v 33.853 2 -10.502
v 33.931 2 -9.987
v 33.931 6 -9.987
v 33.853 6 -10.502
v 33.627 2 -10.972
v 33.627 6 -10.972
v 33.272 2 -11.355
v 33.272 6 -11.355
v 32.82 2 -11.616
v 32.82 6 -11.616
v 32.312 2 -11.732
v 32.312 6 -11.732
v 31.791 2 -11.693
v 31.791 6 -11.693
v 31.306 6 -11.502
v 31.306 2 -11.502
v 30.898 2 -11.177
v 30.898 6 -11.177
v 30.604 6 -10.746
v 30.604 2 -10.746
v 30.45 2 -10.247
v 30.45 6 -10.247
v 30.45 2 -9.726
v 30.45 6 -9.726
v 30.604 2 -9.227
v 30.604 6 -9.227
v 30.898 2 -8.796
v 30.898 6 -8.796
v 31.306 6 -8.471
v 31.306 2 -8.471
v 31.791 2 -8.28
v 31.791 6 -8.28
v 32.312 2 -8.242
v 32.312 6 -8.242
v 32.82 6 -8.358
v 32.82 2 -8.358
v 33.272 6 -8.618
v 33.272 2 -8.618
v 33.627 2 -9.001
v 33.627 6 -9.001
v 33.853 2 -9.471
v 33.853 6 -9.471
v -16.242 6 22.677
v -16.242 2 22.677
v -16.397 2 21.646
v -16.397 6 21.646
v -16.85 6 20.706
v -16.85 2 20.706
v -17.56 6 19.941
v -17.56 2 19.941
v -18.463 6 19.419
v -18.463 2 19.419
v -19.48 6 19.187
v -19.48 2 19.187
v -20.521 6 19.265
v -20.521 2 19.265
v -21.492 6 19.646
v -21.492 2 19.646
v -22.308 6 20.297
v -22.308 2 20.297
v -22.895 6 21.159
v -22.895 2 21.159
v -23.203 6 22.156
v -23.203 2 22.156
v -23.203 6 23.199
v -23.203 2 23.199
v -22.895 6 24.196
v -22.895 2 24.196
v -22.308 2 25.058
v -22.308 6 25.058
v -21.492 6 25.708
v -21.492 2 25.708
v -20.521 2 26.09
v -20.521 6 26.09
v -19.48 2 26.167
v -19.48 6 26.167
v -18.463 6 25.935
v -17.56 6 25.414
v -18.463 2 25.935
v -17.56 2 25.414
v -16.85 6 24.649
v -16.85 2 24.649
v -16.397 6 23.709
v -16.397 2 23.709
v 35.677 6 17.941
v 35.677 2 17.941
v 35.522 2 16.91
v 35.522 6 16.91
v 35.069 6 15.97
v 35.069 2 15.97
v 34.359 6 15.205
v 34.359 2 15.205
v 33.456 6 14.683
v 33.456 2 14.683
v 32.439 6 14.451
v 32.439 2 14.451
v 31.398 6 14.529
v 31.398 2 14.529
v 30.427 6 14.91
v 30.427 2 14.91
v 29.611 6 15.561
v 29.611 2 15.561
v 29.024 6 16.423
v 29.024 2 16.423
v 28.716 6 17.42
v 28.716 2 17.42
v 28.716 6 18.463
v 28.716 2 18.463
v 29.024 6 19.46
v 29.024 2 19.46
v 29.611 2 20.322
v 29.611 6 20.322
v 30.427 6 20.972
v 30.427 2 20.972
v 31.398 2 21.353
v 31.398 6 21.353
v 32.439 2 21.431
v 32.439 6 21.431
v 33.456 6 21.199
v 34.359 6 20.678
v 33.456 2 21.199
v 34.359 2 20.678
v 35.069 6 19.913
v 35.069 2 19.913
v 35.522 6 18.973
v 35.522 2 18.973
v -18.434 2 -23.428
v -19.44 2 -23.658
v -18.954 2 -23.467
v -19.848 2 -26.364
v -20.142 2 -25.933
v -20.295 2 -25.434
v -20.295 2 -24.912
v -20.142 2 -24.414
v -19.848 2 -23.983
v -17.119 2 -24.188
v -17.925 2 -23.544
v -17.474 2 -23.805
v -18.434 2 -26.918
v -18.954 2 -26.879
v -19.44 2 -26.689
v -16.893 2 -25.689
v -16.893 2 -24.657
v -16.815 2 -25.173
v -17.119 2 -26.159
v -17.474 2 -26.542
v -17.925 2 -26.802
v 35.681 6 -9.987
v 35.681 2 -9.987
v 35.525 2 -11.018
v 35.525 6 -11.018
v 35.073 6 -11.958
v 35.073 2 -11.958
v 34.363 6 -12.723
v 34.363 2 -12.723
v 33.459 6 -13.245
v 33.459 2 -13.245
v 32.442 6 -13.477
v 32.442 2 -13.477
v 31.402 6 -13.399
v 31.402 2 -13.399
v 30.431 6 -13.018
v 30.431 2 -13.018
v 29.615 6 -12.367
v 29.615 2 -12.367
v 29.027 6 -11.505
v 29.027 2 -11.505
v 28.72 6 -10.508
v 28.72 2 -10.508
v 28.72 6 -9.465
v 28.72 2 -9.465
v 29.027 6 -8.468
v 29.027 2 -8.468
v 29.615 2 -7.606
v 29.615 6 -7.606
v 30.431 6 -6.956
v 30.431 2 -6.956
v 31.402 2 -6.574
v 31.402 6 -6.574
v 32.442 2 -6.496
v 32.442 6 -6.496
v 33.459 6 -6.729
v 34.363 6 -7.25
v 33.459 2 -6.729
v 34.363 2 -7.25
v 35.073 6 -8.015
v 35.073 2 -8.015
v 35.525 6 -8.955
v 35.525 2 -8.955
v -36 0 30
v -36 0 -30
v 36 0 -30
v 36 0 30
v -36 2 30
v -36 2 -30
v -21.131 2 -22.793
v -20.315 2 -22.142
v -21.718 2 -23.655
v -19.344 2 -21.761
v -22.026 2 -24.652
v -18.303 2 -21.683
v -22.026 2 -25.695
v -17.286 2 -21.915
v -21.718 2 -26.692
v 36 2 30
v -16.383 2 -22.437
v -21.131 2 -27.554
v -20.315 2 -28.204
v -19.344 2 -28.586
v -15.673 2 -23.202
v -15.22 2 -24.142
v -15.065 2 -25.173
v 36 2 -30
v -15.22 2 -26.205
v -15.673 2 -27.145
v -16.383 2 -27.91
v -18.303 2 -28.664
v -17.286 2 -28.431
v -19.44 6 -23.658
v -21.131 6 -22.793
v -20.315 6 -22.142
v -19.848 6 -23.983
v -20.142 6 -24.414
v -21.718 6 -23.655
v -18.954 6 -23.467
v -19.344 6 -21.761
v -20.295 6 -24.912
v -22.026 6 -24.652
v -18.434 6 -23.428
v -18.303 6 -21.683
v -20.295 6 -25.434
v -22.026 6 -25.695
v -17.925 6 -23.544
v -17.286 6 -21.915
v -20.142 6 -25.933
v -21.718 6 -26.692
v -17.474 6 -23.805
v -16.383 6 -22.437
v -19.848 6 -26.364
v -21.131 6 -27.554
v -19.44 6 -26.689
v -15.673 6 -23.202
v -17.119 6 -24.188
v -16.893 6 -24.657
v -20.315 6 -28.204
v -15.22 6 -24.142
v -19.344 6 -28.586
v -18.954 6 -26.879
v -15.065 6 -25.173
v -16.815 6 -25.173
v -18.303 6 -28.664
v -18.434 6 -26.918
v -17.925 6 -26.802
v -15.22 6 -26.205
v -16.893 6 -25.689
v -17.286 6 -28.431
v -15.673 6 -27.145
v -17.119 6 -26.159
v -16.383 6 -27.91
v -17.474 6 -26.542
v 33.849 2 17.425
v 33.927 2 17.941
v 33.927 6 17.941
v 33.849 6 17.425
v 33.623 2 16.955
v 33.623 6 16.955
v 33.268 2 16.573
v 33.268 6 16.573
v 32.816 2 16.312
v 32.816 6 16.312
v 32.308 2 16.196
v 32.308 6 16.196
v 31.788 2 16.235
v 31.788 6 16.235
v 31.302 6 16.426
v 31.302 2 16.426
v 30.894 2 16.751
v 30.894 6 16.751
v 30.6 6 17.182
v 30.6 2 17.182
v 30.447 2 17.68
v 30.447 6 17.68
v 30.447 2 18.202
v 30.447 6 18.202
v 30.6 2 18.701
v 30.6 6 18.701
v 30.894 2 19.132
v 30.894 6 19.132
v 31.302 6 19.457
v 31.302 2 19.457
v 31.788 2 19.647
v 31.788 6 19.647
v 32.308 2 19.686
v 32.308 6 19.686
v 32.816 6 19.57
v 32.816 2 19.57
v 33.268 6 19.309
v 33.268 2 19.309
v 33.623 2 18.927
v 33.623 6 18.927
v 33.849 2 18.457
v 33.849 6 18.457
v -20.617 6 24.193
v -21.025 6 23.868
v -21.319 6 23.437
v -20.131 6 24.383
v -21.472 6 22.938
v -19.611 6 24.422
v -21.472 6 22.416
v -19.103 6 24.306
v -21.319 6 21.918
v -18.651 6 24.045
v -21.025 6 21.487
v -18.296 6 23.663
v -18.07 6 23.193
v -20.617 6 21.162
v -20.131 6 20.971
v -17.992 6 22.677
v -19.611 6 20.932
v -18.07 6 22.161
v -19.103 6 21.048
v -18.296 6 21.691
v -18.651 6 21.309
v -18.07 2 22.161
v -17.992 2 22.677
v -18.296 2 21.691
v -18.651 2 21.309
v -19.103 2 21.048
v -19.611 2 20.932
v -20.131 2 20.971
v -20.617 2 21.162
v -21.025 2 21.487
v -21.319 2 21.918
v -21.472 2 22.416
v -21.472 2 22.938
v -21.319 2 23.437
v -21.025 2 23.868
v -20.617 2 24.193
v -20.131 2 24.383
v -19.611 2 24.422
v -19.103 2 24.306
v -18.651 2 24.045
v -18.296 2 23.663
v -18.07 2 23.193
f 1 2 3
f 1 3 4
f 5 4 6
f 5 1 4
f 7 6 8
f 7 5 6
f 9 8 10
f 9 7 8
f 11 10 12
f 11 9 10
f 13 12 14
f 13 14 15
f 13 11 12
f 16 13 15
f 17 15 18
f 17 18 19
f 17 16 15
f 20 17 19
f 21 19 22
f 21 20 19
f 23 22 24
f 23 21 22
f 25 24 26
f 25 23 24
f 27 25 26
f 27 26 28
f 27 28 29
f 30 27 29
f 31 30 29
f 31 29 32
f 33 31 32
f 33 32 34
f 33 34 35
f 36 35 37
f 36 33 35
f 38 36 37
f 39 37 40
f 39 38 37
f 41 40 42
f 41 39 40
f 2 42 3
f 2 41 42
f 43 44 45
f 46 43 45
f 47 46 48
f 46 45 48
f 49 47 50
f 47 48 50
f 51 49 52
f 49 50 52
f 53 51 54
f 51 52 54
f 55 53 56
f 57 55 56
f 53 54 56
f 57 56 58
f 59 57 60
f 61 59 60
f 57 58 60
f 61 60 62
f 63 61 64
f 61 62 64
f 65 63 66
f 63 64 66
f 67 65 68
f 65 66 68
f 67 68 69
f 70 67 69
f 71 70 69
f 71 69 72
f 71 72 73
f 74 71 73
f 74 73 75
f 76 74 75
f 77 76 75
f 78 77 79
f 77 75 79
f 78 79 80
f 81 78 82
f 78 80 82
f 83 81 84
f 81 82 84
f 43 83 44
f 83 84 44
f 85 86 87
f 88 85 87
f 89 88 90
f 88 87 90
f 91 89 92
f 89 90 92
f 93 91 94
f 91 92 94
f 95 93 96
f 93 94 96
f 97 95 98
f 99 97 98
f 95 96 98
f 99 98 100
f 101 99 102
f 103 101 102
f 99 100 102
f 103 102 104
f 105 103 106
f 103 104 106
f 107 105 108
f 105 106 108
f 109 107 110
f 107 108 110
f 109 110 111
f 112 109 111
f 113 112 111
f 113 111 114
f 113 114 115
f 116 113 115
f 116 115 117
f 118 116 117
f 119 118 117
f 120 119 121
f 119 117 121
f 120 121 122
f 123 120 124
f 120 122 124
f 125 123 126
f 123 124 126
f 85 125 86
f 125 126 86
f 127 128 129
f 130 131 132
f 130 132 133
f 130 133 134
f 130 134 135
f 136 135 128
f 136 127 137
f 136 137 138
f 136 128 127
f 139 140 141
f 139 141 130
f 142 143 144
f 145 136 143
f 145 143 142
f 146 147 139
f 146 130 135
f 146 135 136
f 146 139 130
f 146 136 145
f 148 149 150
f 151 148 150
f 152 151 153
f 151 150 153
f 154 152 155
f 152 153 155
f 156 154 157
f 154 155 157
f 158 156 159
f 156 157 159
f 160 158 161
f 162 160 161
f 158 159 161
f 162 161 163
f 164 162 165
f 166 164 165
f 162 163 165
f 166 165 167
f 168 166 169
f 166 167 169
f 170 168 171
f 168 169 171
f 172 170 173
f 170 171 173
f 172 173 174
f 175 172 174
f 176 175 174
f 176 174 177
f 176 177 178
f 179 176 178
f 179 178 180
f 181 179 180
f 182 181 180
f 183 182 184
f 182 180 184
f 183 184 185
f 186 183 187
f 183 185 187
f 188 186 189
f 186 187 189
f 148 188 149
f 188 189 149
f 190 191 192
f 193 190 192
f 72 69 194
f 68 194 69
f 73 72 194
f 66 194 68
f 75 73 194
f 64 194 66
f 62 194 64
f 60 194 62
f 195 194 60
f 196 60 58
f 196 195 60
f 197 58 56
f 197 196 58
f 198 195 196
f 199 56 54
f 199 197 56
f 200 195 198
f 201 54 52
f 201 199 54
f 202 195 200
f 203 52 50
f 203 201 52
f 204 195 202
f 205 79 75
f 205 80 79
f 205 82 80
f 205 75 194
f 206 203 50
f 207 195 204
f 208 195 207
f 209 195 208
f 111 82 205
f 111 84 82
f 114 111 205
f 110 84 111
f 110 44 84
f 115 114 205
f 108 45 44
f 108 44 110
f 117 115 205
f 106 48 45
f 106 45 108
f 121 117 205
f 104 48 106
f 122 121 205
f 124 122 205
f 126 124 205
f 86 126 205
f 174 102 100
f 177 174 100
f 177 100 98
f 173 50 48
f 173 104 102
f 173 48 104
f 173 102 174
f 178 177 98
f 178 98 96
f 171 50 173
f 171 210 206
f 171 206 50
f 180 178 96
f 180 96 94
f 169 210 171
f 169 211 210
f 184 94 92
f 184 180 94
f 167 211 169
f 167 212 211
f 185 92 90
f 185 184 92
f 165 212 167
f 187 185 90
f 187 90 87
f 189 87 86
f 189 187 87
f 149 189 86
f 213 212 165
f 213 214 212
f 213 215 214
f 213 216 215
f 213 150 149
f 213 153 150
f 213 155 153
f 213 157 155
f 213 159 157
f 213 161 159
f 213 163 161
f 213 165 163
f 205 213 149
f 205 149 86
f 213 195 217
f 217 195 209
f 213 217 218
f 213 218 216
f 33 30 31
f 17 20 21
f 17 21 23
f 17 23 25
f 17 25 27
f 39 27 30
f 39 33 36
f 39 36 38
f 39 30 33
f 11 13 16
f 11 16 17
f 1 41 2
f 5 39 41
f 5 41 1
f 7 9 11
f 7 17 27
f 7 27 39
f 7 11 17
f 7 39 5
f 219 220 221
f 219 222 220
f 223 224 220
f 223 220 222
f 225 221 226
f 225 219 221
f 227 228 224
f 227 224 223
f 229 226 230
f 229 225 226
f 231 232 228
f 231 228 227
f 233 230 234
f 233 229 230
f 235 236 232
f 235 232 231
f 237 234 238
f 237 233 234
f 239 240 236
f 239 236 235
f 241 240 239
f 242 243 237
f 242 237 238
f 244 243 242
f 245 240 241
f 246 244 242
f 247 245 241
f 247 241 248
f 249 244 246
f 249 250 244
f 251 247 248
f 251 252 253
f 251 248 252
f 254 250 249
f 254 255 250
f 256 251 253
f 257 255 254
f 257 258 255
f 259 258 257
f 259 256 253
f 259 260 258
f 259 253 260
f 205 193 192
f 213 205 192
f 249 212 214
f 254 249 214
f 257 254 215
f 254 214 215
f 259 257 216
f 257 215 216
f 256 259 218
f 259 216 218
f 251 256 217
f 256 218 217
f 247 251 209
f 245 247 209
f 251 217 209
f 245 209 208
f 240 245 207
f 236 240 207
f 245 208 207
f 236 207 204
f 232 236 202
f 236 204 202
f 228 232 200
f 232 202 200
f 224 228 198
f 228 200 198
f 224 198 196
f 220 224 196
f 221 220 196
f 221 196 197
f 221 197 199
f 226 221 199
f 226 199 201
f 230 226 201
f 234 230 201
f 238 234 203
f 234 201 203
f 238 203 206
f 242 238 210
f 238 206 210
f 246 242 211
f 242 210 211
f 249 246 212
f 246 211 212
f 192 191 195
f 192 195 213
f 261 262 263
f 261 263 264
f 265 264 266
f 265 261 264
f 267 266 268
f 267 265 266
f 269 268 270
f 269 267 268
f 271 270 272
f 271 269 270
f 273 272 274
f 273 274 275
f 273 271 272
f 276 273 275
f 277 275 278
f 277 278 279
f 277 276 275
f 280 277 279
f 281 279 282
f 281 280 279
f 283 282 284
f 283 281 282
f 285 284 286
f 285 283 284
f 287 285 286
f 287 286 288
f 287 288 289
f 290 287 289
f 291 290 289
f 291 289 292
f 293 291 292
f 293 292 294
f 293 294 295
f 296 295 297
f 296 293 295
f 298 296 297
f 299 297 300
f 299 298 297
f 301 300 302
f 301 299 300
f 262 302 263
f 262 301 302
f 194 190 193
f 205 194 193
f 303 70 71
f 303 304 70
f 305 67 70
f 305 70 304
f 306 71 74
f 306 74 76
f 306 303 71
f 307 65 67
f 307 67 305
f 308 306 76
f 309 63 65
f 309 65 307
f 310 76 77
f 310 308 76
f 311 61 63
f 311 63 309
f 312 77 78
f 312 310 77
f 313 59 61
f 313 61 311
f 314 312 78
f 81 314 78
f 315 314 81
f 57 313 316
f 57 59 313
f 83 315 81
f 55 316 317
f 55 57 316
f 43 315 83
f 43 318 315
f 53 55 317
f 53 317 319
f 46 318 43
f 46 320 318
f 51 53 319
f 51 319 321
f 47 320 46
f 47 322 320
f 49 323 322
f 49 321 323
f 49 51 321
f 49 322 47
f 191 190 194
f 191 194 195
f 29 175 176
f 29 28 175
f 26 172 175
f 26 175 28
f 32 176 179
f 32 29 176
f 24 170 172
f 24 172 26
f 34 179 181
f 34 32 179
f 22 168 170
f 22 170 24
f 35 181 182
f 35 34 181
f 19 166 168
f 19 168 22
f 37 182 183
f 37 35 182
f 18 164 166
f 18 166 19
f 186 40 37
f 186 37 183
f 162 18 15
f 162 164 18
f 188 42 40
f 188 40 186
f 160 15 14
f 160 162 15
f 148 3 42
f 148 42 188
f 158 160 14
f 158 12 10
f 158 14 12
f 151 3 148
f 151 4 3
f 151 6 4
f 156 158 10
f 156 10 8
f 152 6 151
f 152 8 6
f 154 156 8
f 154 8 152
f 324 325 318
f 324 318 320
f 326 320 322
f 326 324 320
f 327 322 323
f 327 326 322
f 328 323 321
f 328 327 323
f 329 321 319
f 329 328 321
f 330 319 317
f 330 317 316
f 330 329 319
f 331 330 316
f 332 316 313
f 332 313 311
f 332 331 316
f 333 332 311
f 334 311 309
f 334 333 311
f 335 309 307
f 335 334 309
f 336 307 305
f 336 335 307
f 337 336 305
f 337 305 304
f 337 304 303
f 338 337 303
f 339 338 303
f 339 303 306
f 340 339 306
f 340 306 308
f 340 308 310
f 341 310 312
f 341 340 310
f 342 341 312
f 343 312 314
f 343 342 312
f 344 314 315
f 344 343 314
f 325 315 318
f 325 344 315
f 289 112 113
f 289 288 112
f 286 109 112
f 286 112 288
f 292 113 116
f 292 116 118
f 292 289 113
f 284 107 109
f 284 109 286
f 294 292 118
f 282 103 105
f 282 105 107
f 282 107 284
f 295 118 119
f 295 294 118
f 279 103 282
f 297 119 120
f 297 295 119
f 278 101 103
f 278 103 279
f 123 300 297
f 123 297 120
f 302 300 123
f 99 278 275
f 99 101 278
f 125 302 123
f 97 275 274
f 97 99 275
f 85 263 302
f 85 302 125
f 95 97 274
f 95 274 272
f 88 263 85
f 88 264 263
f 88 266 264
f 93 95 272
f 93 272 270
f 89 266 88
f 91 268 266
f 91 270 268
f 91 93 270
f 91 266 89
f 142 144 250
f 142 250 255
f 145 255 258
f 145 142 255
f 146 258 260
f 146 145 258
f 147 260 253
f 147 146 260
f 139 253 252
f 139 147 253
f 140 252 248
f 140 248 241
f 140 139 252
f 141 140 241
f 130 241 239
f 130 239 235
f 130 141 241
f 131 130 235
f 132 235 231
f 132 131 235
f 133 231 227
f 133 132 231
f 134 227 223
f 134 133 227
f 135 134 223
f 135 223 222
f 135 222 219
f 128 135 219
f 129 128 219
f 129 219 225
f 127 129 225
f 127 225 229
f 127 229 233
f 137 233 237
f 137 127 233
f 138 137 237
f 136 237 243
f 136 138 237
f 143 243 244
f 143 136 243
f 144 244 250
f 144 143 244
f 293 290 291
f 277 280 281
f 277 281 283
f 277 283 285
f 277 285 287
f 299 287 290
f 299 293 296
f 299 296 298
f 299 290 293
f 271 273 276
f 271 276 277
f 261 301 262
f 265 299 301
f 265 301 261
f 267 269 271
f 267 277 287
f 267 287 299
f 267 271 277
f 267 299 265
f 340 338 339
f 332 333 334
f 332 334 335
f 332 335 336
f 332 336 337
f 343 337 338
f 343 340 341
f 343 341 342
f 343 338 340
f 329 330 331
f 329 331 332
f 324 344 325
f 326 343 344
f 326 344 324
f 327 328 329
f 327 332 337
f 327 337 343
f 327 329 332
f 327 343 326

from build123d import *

# Parameters (mm, degrees)
ESQUISSE1_W             = 72
ESQUISSE1_H             = 60
BOSS_EXTRU_1_DEPTH      = 2
ESQUISSE3_R             = 3.5
BOSS_EXTRU_2_DEPTH      = 4
ESQUISSE2_R             = 1.75
ENL_V_MAT_EXTRU_1_DEPTH = 4


with BuildPart() as part:
    # Esquisse1 → Boss.-Extru.1 (new body)
    with BuildSketch(Plane(origin=(0, 0, 0), x_dir=(1, 0, 0), z_dir=(0, 1, 0))):
        Rectangle(ESQUISSE1_W, ESQUISSE1_H)
    extrude(amount=BOSS_EXTRU_1_DEPTH)

    # Esquisse3 → Boss.-Extru.2 (add)
    with BuildSketch(Plane(origin=(0, 2, 0), x_dir=(1, 0, 0), z_dir=(0, 1, 0))):
        with Locations((-19.741989578, -22.677254534)):
            Circle(ESQUISSE3_R)
        with Locations((32.17700457, -17.941217791)):
            Circle(ESQUISSE3_R)
        with Locations((32.180787909, 9.986620664)):
            Circle(ESQUISSE3_R)
        with Locations((-18.564843267, 25.173313711)):
            Circle(ESQUISSE3_R)
    extrude(amount=BOSS_EXTRU_2_DEPTH)

    # Esquisse2 → Enlèv. mat.-Extru.1 (cut)
    with BuildSketch(Plane(origin=(0, 2, 0), x_dir=(1, 0, 0), z_dir=(0, 1, 0))):
        with Locations((-18.564843267, 25.173313711)):
            Circle(ESQUISSE2_R)
        with Locations((32.180787909, 9.986620664)):
            Circle(ESQUISSE2_R)
        with Locations((32.17700457, -17.941217791)):
            Circle(ESQUISSE2_R)
        with Locations((-19.741989578, -22.677254534)):
            Circle(ESQUISSE2_R)
    extrude(amount=ENL_V_MAT_EXTRU_1_DEPTH, mode=Mode.SUBTRACT)


solid = part.part
